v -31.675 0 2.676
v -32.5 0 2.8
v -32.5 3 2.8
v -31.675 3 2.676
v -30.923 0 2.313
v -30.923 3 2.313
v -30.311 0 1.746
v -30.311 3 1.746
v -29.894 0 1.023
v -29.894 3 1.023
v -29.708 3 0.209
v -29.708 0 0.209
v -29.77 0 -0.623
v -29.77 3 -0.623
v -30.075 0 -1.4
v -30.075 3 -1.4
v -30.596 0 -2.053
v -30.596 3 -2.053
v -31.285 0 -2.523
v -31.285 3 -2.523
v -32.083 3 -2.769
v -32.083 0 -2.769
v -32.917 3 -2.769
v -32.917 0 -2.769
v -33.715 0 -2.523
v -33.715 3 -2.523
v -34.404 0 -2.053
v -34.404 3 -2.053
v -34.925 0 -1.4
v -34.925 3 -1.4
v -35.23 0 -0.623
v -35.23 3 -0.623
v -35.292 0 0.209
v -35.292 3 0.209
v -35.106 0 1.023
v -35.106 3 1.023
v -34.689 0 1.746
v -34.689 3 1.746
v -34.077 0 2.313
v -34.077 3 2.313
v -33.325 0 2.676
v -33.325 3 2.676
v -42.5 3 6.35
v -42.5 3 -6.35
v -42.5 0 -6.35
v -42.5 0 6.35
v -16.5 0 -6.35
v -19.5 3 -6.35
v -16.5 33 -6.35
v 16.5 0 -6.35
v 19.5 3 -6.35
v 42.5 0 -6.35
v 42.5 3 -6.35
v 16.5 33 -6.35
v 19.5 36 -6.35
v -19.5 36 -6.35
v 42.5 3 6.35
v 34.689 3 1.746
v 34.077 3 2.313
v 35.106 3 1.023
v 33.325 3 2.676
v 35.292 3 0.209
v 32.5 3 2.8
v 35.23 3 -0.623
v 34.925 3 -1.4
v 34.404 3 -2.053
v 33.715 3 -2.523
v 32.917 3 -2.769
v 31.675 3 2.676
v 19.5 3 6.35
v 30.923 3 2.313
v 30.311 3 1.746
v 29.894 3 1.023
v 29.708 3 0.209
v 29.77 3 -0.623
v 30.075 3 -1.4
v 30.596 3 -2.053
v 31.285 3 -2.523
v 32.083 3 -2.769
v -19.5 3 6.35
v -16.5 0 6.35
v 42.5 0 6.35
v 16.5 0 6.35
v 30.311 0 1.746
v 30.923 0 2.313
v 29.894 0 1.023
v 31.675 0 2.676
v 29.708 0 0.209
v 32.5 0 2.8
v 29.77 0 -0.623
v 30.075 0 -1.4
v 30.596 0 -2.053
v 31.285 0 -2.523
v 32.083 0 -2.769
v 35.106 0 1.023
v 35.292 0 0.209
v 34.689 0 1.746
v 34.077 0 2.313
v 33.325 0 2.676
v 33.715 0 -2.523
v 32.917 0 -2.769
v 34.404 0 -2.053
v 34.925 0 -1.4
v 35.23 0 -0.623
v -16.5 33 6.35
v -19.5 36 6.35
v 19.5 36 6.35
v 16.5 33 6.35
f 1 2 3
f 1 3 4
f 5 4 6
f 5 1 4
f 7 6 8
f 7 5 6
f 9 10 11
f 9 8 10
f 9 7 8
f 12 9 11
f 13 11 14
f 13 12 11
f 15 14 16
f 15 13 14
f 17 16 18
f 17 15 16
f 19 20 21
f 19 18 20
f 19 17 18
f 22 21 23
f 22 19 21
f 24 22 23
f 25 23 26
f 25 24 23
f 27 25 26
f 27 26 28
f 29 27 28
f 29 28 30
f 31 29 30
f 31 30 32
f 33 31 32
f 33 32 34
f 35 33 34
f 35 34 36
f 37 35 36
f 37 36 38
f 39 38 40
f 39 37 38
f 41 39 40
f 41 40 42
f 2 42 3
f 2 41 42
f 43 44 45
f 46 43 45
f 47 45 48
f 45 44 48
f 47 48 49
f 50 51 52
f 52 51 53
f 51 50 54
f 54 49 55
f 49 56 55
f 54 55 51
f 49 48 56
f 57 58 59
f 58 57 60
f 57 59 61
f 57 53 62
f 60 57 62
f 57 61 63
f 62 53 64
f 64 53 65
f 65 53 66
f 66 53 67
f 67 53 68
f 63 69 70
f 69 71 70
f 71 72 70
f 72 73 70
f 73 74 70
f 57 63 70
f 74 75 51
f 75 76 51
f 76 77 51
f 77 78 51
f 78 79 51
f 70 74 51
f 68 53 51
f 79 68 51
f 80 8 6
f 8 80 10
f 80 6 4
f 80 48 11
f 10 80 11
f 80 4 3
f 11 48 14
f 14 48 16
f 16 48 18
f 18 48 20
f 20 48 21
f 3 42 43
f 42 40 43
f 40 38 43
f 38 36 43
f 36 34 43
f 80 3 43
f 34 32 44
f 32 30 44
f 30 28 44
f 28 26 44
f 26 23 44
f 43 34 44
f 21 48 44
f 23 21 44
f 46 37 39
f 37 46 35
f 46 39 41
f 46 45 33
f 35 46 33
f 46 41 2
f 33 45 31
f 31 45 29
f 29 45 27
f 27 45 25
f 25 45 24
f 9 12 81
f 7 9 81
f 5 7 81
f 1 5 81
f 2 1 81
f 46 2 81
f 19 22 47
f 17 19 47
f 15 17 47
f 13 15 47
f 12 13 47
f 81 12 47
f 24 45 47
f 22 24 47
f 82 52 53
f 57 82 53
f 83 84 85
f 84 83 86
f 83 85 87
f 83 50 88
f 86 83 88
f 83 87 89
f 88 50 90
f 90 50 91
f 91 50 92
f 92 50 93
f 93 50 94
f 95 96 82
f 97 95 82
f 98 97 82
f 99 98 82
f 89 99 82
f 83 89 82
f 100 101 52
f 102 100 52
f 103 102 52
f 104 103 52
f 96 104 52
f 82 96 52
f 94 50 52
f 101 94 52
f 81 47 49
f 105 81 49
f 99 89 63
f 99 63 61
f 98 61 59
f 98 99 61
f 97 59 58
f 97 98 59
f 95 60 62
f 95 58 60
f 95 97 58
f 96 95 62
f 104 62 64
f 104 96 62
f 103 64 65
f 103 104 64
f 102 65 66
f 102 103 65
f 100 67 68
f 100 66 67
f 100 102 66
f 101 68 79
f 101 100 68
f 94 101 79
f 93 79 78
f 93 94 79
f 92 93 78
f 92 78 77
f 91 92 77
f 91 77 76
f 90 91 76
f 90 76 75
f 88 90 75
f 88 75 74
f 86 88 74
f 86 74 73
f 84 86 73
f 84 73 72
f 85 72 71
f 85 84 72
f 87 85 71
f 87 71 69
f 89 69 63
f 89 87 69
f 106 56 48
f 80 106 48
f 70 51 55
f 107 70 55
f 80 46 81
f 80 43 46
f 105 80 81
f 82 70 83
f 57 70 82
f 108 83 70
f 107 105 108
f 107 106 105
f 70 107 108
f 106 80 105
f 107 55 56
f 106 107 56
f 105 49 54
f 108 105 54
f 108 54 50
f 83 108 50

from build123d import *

# Parameters (mm, degrees)
EXTRUDE_THIN1_DEPTH      = 6.35
EXTRUDE_THIN1_DEPTH_BACK = 6.35
CUT_EXTRUDE2_DEPTH       = 57.058652321
CUT_EXTRUDE2_DEPTH_BACK  = 57.058652321
SKETCH2_R                = 2.8


with BuildPart() as part:
    # Sketch1 → Extrude-Thin1 (new, two sides: drawn at the far end of the back side and taken through both)
    with BuildSketch(Plane.XY.offset(-EXTRUDE_THIN1_DEPTH_BACK)):
        Polygon((-42.5, 0), (-16.5, 0), (-16.5, 33), (16.5, 33), (16.5, 0), (42.5, 0), (42.5, 3), (19.5, 3), (19.5, 36), (-19.5, 36), (-19.5, 3), (-42.5, 3), align=None)
    extrude(amount=EXTRUDE_THIN1_DEPTH + EXTRUDE_THIN1_DEPTH_BACK)

    # Sketch2 → Cut-Extrude2 (cut, two sides: drawn at the far end of the back side and taken through both)
    with BuildSketch(Plane(origin=(0, 0, 0), x_dir=(1, 0, 0), z_dir=(0, 1, 0)).offset(-CUT_EXTRUDE2_DEPTH_BACK)):
        with Locations(Location((32.5, 0, 0), (0, 0, 270))):
            Circle(SKETCH2_R)
        with Locations(Location((-32.5, 0, 0), (0, 0, 270))):
            Circle(SKETCH2_R)
    extrude(amount=CUT_EXTRUDE2_DEPTH + CUT_EXTRUDE2_DEPTH_BACK, mode=Mode.SUBTRACT)


solid = part.part
